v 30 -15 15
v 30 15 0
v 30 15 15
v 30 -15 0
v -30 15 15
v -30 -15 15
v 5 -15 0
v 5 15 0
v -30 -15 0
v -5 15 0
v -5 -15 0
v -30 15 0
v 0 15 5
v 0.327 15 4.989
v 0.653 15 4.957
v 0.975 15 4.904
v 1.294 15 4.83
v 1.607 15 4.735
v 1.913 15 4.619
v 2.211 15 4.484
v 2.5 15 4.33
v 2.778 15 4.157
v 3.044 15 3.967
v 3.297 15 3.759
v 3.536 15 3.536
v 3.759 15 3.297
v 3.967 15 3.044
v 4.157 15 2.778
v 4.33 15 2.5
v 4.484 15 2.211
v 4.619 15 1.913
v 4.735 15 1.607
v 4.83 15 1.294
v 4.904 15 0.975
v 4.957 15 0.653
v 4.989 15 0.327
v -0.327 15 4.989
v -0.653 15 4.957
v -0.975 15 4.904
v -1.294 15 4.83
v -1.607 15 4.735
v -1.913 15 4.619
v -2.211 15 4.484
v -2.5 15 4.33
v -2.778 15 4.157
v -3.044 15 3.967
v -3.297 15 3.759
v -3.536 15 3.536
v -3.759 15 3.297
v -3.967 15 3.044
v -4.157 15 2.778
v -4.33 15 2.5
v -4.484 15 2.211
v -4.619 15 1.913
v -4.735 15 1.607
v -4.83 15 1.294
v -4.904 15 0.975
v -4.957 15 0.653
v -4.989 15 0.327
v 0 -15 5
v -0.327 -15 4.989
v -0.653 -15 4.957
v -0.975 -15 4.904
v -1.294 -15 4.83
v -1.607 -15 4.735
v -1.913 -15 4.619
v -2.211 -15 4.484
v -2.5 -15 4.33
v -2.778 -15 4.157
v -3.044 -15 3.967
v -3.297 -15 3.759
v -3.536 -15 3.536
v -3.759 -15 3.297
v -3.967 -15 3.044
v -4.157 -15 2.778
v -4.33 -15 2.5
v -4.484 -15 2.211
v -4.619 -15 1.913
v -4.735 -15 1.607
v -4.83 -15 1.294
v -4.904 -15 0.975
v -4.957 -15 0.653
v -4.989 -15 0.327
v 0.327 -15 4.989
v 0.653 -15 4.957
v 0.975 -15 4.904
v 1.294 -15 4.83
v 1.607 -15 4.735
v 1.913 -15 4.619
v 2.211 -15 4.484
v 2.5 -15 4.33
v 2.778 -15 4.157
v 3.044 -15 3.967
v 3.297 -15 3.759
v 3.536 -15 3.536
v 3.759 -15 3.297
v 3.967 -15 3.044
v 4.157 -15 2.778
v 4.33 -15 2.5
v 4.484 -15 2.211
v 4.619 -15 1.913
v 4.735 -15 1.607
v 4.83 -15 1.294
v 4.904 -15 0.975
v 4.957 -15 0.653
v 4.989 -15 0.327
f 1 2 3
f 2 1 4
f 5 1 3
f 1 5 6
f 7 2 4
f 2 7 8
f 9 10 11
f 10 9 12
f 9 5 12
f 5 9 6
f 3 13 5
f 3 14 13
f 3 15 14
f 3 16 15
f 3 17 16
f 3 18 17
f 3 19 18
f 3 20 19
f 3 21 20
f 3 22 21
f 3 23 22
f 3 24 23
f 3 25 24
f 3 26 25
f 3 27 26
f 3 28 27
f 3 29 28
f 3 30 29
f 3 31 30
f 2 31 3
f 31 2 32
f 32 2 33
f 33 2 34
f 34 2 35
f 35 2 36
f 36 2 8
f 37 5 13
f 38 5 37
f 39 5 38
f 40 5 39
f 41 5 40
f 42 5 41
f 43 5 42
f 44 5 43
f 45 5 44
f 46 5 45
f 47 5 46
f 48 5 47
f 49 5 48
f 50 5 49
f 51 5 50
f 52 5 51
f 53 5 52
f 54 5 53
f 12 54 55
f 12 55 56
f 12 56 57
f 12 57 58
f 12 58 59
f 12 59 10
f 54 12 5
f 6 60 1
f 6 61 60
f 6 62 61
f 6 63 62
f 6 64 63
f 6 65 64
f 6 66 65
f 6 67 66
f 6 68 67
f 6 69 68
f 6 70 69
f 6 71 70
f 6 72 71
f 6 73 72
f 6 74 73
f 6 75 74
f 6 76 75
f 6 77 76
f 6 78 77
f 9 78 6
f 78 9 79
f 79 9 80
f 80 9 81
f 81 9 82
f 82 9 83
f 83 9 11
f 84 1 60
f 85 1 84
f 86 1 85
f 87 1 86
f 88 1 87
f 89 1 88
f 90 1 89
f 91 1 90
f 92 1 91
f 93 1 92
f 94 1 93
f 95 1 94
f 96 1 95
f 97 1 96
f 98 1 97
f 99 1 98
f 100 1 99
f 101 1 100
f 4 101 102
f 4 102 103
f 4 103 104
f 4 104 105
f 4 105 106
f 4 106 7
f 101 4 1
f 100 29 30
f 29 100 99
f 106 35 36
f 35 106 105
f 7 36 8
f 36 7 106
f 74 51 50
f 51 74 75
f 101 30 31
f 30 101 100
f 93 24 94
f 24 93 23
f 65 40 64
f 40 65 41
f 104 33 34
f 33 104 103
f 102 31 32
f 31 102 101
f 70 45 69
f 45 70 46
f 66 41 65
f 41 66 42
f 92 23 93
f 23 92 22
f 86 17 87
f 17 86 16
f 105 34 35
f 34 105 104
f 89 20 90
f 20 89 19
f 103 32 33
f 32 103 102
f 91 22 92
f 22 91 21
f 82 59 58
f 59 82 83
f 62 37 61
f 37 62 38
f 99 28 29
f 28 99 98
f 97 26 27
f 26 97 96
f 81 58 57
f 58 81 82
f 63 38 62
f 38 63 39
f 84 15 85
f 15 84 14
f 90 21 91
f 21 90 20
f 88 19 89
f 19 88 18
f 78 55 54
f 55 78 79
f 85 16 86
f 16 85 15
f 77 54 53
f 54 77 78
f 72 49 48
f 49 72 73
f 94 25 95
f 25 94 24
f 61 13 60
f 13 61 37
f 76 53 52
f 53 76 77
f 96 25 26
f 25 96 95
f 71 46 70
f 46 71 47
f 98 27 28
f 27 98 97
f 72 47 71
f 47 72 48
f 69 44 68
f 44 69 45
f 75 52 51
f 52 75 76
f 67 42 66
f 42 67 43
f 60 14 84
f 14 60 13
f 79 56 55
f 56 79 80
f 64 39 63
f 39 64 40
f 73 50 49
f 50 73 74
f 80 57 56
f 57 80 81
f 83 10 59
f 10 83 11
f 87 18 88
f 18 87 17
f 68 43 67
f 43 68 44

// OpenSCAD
// Cable bridge - lets cables cross under a bench mat
// Print orientation: flat on bed, tunnel opening at floor level

block_len    = 60;    // block length along X (mm)
block_wid    = 30;    // block width along Y (mm)
block_h      = 15;    // block height along Z (mm)
tunnel_d     = 10;    // tunnel cylinder diameter (mm)
tunnel_x     = 0;     // tunnel axis X position (mm)
tunnel_z     = 0;     // tunnel axis Z position (floor level) (mm)
cut_extra    = 1;     // overshoot of cutting shapes past faces (mm)

$fn = 96;

difference() {
    // Main block, centred in X and Y, resting on z = 0
    translate([-block_len/2, -block_wid/2, 0])
        cube([block_len, block_wid, block_h]);

    // Semicircular tunnel: full cylinder along Y with axis at z = 0;
    // the lower half falls below the bed, leaving a half-round channel
    translate([tunnel_x, 0, tunnel_z])
        rotate([90, 0, 0])
            cylinder(d = tunnel_d, h = block_wid + 2*cut_extra, center = true);
}
